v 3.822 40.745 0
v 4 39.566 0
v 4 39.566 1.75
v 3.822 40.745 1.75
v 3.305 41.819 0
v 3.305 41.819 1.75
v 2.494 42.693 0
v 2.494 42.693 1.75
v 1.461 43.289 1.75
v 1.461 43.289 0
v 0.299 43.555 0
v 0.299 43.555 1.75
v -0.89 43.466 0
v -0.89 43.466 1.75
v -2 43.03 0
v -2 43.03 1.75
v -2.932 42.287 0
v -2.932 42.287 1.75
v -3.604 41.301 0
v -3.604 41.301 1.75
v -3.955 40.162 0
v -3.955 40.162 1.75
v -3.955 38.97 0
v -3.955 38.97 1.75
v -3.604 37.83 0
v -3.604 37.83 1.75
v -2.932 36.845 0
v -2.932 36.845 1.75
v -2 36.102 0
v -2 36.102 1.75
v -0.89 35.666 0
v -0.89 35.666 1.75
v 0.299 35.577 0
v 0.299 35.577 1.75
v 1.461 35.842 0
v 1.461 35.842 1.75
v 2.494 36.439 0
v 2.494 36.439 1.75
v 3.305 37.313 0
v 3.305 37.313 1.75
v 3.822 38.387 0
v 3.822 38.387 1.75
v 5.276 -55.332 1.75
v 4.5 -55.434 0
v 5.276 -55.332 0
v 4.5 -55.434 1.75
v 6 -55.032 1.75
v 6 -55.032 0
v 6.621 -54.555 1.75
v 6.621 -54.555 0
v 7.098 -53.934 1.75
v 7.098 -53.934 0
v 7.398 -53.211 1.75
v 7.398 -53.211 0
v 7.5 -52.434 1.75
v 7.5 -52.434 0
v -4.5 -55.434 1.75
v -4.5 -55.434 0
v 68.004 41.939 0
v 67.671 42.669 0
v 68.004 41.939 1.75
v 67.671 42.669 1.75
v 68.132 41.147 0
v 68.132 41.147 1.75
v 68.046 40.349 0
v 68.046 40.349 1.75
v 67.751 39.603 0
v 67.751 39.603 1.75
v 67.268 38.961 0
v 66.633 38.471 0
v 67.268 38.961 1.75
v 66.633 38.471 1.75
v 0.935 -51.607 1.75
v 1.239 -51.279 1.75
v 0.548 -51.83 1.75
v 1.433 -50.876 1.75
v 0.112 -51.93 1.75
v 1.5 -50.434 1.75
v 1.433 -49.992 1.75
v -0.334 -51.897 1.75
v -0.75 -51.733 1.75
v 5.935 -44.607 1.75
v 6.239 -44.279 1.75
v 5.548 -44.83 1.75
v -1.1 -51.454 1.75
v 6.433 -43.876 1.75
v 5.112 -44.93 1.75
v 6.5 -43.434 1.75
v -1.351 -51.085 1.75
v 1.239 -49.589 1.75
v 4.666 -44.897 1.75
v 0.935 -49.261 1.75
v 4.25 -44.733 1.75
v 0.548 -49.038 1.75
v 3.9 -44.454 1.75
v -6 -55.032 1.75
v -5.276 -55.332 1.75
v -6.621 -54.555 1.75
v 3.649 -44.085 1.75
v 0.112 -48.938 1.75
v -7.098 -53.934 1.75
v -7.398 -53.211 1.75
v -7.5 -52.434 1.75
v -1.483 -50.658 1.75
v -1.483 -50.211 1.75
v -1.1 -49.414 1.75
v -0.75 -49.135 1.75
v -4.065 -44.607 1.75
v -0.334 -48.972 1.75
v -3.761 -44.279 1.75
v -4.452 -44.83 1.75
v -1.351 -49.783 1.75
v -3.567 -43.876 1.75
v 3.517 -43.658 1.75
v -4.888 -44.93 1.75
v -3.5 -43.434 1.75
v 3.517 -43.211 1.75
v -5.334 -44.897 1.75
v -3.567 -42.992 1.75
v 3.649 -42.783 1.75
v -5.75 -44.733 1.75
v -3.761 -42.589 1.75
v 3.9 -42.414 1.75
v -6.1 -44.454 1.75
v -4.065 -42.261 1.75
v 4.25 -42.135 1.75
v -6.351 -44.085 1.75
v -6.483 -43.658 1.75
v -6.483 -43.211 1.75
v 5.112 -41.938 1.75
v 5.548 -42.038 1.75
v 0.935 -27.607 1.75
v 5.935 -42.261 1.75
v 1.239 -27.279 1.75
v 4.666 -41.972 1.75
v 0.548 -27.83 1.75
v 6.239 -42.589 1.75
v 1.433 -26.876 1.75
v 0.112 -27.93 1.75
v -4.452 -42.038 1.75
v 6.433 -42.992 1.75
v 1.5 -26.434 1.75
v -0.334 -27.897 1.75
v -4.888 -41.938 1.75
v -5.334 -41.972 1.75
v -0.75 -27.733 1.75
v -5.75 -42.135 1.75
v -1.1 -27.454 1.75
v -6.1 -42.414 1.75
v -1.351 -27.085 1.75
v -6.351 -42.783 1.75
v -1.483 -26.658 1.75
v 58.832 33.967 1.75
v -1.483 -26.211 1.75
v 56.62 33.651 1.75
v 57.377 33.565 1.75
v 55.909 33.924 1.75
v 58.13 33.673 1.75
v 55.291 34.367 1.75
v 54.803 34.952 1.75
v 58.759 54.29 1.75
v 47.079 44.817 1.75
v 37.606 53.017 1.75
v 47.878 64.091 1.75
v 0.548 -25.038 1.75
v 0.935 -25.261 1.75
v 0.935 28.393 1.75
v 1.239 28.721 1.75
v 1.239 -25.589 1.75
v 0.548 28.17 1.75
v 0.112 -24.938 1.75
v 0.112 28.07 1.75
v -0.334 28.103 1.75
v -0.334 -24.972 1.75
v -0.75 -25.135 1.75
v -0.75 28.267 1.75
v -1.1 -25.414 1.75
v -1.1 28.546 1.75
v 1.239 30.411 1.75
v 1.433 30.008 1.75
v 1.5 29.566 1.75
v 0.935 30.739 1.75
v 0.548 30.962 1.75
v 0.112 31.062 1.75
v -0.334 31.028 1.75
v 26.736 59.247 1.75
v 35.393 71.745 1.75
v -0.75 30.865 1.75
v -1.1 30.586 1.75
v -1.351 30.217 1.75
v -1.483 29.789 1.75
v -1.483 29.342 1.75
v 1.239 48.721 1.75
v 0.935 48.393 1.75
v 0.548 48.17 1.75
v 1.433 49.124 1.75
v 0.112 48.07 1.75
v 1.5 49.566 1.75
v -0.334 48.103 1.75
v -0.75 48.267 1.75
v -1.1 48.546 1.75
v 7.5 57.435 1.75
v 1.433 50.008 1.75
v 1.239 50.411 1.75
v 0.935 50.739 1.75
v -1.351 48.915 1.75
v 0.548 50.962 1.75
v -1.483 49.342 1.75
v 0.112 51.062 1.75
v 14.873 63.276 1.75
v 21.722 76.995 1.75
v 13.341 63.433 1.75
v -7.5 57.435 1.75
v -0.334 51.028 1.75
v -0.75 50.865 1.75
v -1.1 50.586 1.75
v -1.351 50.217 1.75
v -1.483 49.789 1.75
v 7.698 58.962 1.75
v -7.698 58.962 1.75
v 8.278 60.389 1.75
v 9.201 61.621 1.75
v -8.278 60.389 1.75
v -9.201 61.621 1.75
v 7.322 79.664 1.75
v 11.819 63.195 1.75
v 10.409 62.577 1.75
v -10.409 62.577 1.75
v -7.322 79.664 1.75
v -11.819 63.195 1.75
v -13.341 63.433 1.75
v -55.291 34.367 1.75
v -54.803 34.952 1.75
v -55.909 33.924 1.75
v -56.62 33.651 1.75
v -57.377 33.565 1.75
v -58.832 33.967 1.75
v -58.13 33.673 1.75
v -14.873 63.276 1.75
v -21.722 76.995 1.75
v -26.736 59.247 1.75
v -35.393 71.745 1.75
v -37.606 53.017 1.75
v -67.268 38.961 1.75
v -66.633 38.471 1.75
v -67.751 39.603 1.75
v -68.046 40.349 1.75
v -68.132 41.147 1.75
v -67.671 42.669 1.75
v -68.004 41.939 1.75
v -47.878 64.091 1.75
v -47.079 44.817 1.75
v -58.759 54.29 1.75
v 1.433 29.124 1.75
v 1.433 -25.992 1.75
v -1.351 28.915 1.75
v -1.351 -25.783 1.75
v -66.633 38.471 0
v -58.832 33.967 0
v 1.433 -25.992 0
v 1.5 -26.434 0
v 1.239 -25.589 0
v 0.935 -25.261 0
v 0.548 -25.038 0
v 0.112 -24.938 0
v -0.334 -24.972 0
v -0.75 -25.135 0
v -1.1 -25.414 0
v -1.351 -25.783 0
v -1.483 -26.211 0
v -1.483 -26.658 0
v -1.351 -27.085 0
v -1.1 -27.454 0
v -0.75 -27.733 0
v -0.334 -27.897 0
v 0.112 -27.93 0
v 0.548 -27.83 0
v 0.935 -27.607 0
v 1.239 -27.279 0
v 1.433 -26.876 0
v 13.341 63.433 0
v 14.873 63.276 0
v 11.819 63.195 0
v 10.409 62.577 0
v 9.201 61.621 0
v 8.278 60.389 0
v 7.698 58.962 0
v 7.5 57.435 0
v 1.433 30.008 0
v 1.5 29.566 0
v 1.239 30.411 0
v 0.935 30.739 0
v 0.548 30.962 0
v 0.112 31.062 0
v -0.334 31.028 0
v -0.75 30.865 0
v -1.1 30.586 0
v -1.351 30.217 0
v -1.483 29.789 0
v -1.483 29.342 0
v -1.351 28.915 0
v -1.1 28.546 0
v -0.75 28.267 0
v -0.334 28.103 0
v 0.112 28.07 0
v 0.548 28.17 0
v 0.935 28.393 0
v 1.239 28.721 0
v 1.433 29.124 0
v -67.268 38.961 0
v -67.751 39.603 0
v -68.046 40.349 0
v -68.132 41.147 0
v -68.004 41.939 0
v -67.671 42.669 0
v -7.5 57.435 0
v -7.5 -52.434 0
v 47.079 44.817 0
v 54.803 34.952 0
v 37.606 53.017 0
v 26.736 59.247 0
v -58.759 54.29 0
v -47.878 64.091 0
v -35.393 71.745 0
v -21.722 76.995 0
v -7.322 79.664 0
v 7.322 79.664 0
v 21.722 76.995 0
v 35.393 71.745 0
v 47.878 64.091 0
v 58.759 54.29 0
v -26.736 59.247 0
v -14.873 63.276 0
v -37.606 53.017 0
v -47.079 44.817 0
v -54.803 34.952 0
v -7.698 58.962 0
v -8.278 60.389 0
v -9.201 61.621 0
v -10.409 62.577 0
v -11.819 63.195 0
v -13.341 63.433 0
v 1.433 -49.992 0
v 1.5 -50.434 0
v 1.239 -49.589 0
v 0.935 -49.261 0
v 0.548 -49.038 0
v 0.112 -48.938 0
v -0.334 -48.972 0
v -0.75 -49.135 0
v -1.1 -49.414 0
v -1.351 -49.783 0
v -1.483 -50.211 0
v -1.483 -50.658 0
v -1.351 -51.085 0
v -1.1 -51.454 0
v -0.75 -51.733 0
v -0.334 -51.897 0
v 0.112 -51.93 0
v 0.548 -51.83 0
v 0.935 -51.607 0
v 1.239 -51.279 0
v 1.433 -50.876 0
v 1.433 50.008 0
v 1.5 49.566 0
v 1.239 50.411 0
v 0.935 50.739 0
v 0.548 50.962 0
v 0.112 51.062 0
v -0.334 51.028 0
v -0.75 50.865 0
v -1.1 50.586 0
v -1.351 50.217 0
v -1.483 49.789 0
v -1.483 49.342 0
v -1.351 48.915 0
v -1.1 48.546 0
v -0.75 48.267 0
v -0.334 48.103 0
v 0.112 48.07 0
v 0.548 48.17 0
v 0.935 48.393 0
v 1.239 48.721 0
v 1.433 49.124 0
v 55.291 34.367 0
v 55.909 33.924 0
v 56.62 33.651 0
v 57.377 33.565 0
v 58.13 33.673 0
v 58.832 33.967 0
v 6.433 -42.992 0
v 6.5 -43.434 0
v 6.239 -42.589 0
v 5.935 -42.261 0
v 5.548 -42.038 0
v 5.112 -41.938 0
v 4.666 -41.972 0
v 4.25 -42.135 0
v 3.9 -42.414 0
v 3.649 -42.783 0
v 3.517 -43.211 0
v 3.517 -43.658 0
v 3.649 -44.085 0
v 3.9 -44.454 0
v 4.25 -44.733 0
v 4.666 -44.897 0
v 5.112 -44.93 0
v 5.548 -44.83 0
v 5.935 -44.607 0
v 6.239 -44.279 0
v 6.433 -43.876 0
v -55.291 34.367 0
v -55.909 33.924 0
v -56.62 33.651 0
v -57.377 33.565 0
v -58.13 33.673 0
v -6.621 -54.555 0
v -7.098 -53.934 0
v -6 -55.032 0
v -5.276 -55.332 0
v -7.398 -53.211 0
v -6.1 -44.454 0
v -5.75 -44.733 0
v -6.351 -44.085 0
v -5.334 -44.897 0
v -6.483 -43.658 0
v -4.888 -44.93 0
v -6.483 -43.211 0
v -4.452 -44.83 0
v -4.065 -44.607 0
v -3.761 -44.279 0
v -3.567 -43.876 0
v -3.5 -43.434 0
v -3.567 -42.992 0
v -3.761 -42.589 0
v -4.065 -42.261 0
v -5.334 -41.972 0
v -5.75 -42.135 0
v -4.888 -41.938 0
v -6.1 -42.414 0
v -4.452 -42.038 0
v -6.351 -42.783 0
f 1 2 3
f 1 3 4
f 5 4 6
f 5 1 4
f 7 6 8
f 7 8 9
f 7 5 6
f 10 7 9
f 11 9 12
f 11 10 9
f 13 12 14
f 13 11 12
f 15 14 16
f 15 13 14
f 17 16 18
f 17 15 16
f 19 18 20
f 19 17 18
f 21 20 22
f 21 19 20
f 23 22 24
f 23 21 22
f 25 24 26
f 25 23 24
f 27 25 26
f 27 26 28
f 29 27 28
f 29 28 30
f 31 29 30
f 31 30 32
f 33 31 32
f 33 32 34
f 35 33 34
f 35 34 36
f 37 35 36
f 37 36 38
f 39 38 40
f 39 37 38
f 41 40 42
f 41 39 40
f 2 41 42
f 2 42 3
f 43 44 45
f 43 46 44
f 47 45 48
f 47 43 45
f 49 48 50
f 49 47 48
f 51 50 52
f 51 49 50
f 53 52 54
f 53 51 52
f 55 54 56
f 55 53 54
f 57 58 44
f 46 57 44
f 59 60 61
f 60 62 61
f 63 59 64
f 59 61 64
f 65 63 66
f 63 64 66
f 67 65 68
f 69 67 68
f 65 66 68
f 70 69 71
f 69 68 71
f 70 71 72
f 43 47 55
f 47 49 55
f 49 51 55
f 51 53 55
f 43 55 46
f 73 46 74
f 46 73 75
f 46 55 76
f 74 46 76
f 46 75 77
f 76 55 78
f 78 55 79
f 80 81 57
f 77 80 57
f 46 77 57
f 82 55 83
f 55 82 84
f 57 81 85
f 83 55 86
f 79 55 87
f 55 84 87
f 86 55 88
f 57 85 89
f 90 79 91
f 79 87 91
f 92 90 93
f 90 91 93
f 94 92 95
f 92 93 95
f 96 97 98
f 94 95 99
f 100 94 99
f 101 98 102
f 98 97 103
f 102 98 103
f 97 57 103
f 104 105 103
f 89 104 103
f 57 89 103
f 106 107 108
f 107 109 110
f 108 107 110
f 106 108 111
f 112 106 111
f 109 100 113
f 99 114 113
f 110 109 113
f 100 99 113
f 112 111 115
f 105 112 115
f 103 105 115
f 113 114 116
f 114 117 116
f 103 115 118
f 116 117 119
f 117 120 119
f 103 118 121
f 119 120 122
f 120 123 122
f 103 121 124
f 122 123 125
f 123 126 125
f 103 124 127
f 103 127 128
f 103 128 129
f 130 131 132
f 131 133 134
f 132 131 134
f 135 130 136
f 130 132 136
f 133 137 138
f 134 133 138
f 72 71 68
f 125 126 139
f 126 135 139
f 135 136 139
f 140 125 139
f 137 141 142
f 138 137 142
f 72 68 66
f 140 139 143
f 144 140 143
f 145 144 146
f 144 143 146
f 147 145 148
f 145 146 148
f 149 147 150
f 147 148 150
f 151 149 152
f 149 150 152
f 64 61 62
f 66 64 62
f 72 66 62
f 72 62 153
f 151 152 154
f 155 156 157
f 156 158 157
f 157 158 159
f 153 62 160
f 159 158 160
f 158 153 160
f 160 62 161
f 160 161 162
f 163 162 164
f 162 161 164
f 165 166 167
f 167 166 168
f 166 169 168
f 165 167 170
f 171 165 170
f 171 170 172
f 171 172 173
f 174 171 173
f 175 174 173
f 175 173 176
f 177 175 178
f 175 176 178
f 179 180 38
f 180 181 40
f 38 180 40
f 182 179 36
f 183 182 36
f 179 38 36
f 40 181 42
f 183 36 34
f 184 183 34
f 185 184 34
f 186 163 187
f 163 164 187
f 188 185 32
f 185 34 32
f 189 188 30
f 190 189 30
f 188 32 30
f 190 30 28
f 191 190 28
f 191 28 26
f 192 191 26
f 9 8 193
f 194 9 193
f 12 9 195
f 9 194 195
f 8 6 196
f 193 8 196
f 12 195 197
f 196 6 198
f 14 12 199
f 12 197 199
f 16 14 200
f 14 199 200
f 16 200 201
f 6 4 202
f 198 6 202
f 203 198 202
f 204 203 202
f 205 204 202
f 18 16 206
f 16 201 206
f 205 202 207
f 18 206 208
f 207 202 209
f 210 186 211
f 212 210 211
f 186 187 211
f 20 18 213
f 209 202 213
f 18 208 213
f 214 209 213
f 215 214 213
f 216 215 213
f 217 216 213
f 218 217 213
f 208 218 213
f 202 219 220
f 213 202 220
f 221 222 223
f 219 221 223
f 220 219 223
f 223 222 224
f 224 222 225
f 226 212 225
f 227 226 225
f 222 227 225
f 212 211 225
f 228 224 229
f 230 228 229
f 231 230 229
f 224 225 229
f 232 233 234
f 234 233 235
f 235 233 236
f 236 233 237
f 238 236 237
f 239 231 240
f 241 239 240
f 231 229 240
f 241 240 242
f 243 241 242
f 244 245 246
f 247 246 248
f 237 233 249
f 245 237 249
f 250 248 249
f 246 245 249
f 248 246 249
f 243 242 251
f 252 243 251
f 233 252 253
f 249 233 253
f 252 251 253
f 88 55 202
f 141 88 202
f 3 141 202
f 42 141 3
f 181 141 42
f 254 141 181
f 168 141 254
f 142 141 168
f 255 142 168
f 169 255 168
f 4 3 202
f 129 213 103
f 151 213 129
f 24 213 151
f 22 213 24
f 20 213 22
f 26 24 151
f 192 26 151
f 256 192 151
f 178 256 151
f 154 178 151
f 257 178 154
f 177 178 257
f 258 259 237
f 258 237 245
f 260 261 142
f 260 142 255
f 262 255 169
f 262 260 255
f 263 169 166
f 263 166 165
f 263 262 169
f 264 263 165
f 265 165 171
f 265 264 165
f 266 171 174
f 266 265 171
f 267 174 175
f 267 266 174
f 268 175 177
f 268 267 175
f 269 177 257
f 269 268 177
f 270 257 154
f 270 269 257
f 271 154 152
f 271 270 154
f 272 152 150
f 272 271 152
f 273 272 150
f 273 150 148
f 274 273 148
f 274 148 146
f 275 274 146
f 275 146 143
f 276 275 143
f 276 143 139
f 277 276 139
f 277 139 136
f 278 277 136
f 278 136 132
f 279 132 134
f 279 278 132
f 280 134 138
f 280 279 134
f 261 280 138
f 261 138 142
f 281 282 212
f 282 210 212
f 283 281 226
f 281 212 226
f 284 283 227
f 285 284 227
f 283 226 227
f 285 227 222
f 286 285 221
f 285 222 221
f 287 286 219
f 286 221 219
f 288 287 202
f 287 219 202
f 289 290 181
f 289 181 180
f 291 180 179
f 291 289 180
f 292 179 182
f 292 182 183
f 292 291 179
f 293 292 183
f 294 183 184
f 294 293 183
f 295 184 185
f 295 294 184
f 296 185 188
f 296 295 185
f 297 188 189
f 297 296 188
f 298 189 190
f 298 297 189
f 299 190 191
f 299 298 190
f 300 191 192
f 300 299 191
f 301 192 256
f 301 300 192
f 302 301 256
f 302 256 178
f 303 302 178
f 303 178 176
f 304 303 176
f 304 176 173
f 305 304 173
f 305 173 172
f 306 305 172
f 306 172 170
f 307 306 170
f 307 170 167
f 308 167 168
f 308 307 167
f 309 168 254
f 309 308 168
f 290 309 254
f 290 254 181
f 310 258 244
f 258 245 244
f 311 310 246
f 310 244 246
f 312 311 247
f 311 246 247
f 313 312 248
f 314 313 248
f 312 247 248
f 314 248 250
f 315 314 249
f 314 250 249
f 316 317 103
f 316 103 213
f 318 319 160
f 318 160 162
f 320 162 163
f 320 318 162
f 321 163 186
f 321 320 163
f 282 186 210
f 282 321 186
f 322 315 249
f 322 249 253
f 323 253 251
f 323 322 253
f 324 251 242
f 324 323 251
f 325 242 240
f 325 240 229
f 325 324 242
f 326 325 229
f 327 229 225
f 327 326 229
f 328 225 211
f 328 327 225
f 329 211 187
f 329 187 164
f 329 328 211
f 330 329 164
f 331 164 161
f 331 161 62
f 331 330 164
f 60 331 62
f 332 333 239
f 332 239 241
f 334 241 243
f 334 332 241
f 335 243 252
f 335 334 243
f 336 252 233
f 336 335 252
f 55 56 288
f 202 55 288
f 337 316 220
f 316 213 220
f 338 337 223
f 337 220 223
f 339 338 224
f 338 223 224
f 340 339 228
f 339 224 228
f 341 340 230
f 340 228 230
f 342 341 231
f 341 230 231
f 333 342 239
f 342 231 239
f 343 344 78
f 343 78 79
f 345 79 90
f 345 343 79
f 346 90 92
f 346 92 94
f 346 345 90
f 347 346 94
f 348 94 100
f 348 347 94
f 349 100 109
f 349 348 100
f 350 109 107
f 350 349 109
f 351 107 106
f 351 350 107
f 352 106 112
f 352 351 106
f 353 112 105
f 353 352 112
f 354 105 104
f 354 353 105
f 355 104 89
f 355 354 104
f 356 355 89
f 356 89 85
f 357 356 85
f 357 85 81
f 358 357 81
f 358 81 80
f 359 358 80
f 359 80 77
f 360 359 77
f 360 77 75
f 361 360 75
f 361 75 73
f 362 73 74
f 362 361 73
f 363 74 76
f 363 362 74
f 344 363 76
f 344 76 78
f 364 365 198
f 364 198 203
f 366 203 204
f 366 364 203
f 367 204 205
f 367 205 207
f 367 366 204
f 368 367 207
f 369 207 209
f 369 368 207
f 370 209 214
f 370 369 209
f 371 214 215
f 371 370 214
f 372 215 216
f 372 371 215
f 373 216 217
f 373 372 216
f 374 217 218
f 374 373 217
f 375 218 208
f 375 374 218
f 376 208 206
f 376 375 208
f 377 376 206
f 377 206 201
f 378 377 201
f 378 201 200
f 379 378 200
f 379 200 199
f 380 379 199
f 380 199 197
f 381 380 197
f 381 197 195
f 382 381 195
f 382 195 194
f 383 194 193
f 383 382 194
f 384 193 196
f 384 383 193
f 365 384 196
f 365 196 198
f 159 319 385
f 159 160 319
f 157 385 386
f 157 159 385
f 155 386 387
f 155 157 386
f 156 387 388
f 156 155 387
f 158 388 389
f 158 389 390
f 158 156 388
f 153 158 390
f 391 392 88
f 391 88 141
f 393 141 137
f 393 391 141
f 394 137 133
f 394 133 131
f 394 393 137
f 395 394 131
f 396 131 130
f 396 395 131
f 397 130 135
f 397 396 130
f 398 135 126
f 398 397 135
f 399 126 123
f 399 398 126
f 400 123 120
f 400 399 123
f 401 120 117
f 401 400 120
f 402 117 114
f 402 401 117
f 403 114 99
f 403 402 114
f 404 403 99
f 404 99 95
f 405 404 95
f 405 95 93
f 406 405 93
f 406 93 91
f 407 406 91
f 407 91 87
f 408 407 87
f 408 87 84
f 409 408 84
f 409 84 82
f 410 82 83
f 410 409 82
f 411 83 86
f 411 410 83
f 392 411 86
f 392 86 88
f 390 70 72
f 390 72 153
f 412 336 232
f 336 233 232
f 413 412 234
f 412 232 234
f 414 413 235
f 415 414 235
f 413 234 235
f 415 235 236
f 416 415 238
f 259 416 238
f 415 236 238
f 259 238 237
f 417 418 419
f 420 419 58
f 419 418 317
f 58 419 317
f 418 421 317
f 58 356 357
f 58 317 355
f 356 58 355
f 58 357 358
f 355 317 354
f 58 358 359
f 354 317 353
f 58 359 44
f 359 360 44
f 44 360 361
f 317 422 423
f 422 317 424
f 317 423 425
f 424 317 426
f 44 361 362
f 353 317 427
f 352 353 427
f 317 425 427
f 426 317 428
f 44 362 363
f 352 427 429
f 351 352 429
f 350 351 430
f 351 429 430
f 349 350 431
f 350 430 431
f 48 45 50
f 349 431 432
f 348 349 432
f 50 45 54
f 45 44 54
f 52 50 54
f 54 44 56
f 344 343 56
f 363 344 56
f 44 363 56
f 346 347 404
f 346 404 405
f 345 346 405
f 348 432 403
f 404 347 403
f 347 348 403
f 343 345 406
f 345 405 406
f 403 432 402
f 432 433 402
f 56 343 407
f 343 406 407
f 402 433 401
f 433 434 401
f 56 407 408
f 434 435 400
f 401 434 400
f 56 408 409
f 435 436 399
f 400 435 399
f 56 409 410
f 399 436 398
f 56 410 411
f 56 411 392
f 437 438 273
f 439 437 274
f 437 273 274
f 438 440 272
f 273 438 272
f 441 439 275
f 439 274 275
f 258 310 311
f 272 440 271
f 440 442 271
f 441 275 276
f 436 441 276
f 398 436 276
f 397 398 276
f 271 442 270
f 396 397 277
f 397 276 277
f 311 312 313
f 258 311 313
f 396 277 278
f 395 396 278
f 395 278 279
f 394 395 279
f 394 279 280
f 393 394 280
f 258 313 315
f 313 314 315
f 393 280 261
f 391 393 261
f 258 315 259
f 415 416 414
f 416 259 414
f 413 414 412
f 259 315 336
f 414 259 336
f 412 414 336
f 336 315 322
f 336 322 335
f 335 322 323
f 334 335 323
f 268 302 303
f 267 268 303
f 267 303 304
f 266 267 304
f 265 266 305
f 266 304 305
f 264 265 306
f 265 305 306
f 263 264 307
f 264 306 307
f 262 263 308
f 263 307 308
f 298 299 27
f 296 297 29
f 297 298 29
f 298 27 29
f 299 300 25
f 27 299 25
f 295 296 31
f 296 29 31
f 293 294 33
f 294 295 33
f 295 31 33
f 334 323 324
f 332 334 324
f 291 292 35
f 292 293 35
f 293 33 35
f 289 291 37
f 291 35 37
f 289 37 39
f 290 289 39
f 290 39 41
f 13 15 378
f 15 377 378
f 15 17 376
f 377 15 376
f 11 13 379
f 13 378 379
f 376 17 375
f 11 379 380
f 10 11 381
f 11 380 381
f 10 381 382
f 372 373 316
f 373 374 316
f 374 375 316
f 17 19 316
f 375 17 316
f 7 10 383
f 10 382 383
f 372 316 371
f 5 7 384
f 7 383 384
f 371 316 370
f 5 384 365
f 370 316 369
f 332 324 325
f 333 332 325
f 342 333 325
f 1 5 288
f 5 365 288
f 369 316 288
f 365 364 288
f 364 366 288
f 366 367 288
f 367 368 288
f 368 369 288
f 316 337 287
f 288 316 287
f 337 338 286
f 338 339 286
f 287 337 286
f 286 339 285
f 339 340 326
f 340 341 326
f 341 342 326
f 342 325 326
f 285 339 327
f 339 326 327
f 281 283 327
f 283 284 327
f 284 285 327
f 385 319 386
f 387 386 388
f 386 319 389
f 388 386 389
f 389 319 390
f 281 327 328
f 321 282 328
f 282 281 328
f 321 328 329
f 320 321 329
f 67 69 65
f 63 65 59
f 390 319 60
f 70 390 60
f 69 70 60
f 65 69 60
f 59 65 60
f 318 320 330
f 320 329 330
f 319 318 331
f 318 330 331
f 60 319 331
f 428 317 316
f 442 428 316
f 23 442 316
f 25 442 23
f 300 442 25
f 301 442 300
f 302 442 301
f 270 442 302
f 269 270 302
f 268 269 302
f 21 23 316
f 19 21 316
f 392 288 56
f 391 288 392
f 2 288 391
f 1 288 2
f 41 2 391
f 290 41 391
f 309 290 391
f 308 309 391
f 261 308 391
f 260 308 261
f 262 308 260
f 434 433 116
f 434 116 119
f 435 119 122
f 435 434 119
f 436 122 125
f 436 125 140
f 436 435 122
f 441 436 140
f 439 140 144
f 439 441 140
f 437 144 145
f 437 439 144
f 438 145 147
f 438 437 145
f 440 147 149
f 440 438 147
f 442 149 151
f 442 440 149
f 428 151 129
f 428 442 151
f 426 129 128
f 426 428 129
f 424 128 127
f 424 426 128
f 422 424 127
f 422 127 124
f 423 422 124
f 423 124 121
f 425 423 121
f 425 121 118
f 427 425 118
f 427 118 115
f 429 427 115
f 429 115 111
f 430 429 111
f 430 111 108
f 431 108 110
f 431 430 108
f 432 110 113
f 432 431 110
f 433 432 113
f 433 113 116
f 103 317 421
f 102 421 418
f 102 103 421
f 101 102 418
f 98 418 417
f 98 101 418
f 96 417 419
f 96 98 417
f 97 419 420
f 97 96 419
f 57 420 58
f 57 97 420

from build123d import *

# Parameters (mm, degrees)
SKETCH_1_W      = 15
SKETCH_1_H      = 120
SKETCH_1_R      = 1.5
SKETCH_1_R_2    = 4
EXTRUDE_1_DEPTH = 1.75
FILLET_1_R      = 3
FILLET_2_R      = 6


with BuildPart() as part:
    # 草图1 → 凸台-拉伸1 (new body)
    # profile 1 of 3: a face of its own
    with BuildSketch(Plane.XY):
        with BuildLine():
            ThreePointArc((56.291651246, 32.5), (0, 65), (-56.291651246, 32.5))
            Line((-56.291651246, 32.5), (-69.282032303, 40))
            ThreePointArc((-69.282032303, 40), (0, 80), (69.282032303, 40))
            Line((69.282032303, 40), (56.291651246, 32.5))
        make_face()
    # profile 2 of 3: a face of its own
    with BuildSketch(Plane.XY):
        with Locations((0, 4.565857851)):
            Rectangle(SKETCH_1_W, SKETCH_1_H)
        with Locations((0, 49.565857851)):
            Circle(SKETCH_1_R, mode=Mode.SUBTRACT)
        with Locations((0, 29.565857851)):
            Circle(SKETCH_1_R, mode=Mode.SUBTRACT)
        with Locations((0, 39.565857851)):
            Circle(SKETCH_1_R_2, mode=Mode.SUBTRACT)
        with Locations((0, -26.434142149)):
            Circle(SKETCH_1_R, mode=Mode.SUBTRACT)
        with Locations((5, -43.434142149)):
            Circle(SKETCH_1_R, mode=Mode.SUBTRACT)
        with Locations((-5, -43.434142149)):
            Circle(SKETCH_1_R, mode=Mode.SUBTRACT)
        with Locations((0, -50.434142149)):
            Circle(SKETCH_1_R, mode=Mode.SUBTRACT)
    # profile 3 of 3: a face of its own
    with BuildSketch(Plane.XY):
        with BuildLine():
            ThreePointArc((7.5, 64.565857851), (0, 65), (-7.5, 64.565857851))
            Line((-7.5, 64.565857851), (7.5, 64.565857851))
        make_face()
    extrude(amount=EXTRUDE_1_DEPTH)

    # 圆角1
    fillet_1_edges = [part.edges().sort_by_distance(p)[0] for p in [
        (7.5, -55.434142149, 0.875),
        (-7.5, -55.434142149, 0.875),
        (-56.291651246, 32.5, 0.875),
        (-69.282032303, 40, 0.875),
        (69.282032303, 40, 0.875),
        (56.291651246, 32.5, 0.875),
    ]]
    fillet(fillet_1_edges, radius=FILLET_1_R)

    # 圆角2
    fillet_2_edges = [part.edges().sort_by_distance(p)[0] for p in [
        (7.5, 64.565857851, 0.875),
        (-7.5, 64.565857851, 0.875),
    ]]
    fillet(fillet_2_edges, radius=FILLET_2_R)


solid = part.part
